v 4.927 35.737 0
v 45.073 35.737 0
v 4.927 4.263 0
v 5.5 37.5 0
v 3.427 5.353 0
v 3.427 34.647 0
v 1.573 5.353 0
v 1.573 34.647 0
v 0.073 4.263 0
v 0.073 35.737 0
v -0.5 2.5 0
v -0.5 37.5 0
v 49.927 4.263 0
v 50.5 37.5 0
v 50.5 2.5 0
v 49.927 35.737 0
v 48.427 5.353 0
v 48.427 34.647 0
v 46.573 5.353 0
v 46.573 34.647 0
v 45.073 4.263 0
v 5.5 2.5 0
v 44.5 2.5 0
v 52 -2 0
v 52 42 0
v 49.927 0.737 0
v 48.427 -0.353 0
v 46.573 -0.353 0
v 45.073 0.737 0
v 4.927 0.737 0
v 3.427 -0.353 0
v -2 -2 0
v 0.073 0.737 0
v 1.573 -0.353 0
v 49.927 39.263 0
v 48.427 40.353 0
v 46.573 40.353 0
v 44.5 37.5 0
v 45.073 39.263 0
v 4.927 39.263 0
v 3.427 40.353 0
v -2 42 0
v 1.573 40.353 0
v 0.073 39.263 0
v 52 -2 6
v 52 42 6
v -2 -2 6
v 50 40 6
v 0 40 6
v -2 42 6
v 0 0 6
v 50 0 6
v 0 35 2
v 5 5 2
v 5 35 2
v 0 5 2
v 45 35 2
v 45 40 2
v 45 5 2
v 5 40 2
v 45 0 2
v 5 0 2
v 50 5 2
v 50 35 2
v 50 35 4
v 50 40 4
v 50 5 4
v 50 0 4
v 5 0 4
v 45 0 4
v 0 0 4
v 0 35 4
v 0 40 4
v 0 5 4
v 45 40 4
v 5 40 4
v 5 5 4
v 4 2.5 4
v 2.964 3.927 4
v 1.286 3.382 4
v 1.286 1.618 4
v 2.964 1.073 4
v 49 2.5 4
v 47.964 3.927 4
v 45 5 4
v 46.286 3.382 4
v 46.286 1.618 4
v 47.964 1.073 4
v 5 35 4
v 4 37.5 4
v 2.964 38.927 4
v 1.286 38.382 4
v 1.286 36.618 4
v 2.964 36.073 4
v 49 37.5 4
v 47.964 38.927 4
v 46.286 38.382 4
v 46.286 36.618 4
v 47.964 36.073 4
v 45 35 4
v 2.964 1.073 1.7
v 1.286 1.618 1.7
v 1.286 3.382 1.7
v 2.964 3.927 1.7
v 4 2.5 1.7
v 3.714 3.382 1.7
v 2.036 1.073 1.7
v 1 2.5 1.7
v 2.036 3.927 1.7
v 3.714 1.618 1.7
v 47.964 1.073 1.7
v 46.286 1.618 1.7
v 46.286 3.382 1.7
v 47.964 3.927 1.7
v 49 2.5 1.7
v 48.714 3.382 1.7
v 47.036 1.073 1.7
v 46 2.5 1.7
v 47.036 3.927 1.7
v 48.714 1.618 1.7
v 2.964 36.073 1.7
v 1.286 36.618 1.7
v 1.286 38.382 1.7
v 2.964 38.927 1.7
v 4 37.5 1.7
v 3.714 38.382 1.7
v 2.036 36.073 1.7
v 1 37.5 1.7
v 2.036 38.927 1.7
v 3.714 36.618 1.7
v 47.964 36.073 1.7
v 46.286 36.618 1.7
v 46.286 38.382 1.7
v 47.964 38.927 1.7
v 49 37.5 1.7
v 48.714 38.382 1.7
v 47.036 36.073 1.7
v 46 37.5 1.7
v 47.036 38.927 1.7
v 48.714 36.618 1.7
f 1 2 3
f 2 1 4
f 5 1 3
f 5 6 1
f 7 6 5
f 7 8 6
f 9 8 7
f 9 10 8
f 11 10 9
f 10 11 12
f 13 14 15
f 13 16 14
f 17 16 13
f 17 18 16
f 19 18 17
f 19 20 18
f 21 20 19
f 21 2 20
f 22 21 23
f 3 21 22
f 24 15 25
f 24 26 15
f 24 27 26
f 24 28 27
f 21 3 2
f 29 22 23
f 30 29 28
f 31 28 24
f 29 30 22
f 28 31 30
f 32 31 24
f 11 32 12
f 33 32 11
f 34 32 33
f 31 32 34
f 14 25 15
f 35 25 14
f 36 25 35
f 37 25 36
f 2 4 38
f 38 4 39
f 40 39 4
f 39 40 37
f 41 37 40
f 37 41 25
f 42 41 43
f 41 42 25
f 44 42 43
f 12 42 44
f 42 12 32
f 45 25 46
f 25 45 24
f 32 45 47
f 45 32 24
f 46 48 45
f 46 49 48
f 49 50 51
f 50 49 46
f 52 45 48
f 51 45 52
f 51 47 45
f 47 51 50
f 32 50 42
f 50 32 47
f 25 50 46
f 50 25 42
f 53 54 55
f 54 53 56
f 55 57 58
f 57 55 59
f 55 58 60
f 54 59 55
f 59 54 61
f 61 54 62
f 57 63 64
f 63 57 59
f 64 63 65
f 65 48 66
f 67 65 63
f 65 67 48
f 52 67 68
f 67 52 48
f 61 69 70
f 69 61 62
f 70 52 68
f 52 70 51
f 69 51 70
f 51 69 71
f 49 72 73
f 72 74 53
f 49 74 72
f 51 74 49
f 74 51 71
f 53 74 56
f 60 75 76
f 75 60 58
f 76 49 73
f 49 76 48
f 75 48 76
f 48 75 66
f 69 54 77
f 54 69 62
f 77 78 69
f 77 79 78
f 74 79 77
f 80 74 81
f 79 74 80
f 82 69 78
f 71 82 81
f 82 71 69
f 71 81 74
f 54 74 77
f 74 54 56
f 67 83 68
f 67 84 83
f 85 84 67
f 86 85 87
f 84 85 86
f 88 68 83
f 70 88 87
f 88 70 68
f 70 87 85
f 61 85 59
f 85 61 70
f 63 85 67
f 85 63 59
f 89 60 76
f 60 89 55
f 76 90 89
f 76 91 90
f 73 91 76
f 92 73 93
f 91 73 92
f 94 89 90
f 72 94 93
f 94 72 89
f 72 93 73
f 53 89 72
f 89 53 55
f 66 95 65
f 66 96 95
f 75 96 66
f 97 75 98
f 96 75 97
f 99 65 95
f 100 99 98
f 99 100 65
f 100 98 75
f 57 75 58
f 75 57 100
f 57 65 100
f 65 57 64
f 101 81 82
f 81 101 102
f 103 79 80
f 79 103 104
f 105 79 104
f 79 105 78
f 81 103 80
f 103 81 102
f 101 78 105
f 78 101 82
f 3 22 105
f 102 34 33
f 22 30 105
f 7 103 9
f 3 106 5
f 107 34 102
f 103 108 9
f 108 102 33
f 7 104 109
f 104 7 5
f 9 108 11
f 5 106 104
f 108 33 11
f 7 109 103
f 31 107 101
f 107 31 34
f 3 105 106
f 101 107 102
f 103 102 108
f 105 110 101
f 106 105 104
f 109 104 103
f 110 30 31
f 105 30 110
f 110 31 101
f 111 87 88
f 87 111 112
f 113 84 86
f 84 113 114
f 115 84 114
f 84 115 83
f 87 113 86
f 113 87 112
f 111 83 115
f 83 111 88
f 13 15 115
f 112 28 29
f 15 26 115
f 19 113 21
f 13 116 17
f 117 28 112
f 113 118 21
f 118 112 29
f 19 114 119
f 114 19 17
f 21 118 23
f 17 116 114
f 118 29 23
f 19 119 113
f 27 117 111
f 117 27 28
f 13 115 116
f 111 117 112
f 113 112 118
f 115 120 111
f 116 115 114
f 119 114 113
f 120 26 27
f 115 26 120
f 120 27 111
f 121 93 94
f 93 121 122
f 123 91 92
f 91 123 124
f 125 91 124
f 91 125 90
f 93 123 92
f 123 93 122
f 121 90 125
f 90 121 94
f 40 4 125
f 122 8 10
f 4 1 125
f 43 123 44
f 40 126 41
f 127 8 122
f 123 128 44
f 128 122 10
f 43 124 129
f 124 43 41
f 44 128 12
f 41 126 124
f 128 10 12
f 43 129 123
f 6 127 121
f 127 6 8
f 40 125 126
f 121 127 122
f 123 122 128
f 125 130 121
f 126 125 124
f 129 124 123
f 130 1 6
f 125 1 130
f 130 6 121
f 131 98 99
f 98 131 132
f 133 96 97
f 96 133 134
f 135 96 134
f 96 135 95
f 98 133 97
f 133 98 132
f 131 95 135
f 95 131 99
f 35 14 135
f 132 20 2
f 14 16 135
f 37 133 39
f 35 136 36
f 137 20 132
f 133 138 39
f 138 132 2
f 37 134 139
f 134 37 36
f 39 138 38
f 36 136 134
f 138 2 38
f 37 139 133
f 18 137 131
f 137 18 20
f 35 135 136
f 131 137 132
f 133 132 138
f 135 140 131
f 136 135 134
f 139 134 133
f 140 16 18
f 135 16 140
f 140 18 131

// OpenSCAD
CASE_THICKNESS = 2;

CASE_INNER_WIDTH = 50;
CASE_INNER_DEPTH = 40;

SPACE_BELOW_PCB = 2.4;
PCB_THICKNESS = 1.6;
POWER_CONNECTOR_HEIGHT = 0;
POWER_CONNECTORS_OPENING_WIDTH = 20;

PCB_TOP_Y       = CASE_THICKNESS + SPACE_BELOW_PCB + PCB_THICKNESS;
CASE_HEIGHT     = PCB_TOP_Y + POWER_CONNECTOR_HEIGHT;
STANDOFF_HEIGHT = PCB_THICKNESS + SPACE_BELOW_PCB;

M3_SCREW_SUNK_DEPTH = 1.7;
M3_SCREW_HEAD_DIAMETER = 6;
M3_SCREW_DIAMETER = 3;


module outer_shape() {
  linear_extrude(height = CASE_HEIGHT)
  polygon(
    [
      [0                - CASE_THICKNESS, 0                - CASE_THICKNESS],
      [CASE_INNER_WIDTH + CASE_THICKNESS, 0                - CASE_THICKNESS],
      [0                - CASE_THICKNESS, CASE_INNER_DEPTH + CASE_THICKNESS],
      [CASE_INNER_WIDTH + CASE_THICKNESS, CASE_INNER_DEPTH + CASE_THICKNESS],
    ],
    [
      [0, 1, 3, 2],  
    ]
  );
}

module inner_space() {
  translate([0,0,CASE_THICKNESS])
  linear_extrude(height = CASE_HEIGHT)
  polygon(
    [
      [0,                0],
      [CASE_INNER_WIDTH, 0],
      [0,                CASE_INNER_DEPTH],
      [CASE_INNER_WIDTH, CASE_INNER_DEPTH],
    ],
    [
      [0, 1, 3, 2],  
    ]
  );
}

module power_connectors_opening(height) {    
    translate([0, 0, height/2])
    cube([POWER_CONNECTORS_OPENING_WIDTH, CASE_THICKNESS, height], center=true);
}

module standoff(height) {
    translate([0, 0, height/2])
    cube([5, 5, height], center= true);
}

module standoff_hole(height) {
    
    union() {
        translate([0, 0, height/2]) cylinder(r=M3_SCREW_DIAMETER/2, h=height,center=true);
       
        translate([0, 0, M3_SCREW_SUNK_DEPTH/2]) cylinder(
            h = M3_SCREW_SUNK_DEPTH,
            r1 = M3_SCREW_HEAD_DIAMETER/2,
            r2 = M3_SCREW_DIAMETER/2,
            center = true
        );
    }
}

module case_base() {
    difference() {
        outer_shape();
        inner_space();
    }
}

module standoffs() {
        translate([2.5,                    2.5,                    0]) standoff(STANDOFF_HEIGHT);
        translate([CASE_INNER_WIDTH - 2.5, 2.5,                    0]) standoff(STANDOFF_HEIGHT);
        translate([2.5,                    CASE_INNER_DEPTH - 2.5, 0]) standoff(STANDOFF_HEIGHT);
        translate([CASE_INNER_WIDTH - 2.5, CASE_INNER_DEPTH - 2.5, 0]) standoff(STANDOFF_HEIGHT);    
}

module standoffs_holes() {
        translate([2.5,                    2.5,                    0]) standoff_hole(STANDOFF_HEIGHT);
        translate([CASE_INNER_WIDTH - 2.5, 2.5,                    0]) standoff_hole(STANDOFF_HEIGHT);
        translate([2.5,                    CASE_INNER_DEPTH - 2.5, 0]) standoff_hole(STANDOFF_HEIGHT);
        translate([CASE_INNER_WIDTH - 2.5, CASE_INNER_DEPTH- 2.5,  0]) standoff_hole(STANDOFF_HEIGHT);
}

difference() {    
    union() { case_base(); standoffs(); }    
    union() {
        standoffs_holes();
        
        translate([25, -CASE_THICKNESS/2, PCB_TOP_Y]) power_connectors_opening(CASE_HEIGHT - PCB_TOP_Y);
    }
}
